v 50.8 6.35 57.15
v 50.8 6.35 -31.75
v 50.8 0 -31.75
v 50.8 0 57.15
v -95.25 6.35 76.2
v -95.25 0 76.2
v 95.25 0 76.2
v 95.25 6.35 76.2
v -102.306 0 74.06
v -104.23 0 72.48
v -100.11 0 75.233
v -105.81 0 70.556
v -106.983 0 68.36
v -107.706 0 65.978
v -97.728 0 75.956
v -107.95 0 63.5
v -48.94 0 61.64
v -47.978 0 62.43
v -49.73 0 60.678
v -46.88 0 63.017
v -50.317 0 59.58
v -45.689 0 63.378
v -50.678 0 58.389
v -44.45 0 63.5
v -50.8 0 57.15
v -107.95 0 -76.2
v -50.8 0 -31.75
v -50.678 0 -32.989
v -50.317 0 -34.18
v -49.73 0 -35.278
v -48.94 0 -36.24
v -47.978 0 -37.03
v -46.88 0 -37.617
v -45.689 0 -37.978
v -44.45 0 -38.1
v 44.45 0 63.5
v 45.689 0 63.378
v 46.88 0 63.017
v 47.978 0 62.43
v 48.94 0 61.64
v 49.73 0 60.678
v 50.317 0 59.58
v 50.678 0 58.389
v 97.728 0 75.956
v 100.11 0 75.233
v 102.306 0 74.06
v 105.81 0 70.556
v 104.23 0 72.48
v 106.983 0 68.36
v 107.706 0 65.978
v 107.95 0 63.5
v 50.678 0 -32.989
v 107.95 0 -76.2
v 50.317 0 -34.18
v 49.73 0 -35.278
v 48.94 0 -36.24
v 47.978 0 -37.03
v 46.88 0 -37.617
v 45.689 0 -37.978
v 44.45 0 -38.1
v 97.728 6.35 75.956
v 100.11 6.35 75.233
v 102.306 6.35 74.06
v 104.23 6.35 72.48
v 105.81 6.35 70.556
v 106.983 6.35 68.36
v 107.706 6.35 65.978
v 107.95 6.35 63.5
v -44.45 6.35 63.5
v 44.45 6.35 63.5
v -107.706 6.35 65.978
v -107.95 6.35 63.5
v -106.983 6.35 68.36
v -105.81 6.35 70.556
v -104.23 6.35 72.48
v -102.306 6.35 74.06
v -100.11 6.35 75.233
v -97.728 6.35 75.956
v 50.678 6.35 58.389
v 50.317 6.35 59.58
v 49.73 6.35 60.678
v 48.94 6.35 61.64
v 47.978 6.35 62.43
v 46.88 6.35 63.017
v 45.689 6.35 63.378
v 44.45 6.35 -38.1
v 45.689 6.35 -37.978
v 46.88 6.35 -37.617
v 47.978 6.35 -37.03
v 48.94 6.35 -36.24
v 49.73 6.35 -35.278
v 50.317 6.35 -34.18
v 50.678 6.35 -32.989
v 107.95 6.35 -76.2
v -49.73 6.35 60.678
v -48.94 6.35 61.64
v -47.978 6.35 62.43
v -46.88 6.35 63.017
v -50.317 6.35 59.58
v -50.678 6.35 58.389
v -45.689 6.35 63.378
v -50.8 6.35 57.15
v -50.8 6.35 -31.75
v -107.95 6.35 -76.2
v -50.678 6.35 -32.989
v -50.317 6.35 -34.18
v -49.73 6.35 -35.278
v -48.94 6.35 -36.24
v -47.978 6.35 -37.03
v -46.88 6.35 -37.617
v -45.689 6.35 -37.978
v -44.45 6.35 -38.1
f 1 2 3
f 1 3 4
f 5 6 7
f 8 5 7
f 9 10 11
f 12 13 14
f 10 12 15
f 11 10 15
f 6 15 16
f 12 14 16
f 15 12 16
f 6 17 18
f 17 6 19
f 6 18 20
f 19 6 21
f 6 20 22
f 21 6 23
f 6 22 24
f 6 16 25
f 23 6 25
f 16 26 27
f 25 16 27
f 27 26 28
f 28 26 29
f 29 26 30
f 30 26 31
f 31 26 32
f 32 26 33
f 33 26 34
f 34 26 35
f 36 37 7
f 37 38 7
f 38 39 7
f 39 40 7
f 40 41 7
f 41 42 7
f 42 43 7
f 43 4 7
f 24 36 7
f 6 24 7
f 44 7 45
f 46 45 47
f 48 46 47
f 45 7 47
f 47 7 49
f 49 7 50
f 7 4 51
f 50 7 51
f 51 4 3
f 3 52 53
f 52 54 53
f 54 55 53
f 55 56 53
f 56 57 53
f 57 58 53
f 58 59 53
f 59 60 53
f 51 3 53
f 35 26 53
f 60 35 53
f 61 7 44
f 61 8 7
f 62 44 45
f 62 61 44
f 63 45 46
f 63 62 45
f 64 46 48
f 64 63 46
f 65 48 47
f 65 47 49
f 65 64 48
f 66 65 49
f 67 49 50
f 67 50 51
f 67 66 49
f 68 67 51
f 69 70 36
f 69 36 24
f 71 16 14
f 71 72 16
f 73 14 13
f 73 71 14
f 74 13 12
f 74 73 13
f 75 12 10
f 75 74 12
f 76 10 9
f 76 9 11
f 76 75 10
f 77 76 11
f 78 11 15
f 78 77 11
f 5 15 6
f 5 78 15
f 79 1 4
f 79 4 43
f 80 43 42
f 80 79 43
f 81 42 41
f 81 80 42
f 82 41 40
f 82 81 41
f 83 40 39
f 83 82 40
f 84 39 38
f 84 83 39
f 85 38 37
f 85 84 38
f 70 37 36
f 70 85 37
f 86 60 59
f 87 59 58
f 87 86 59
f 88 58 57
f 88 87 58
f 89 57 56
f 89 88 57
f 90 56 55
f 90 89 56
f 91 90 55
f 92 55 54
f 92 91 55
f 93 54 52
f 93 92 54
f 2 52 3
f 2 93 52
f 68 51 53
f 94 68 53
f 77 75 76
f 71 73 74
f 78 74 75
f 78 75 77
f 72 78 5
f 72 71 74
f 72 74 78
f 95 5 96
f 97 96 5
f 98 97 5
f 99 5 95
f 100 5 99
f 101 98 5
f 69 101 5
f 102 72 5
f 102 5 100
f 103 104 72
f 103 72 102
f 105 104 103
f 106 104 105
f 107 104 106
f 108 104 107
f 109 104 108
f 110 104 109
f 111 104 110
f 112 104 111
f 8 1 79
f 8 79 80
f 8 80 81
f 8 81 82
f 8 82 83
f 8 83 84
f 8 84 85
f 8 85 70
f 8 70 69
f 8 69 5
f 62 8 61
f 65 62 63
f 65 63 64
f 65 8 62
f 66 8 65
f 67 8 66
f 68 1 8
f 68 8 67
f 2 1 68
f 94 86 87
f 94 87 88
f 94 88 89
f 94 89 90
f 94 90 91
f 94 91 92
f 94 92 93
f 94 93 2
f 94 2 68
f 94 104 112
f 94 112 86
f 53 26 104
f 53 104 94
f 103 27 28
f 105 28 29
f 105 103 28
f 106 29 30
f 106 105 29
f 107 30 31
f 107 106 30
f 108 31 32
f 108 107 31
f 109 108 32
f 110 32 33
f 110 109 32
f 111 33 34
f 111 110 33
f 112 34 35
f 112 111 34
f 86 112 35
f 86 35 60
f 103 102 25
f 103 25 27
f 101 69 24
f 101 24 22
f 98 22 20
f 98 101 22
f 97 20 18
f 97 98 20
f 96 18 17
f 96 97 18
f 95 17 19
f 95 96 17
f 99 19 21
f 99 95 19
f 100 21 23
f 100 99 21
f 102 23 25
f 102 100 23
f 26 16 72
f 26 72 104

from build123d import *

# Parameters (mm, degrees)
ESQUISSE1_W             = 215.9
ESQUISSE1_H             = 152.4
BOSS_EXTRU_1_DEPTH      = 6.35
CONG_1_R                = 12.7
ENL_V_MAT_EXTRU_1_DEPTH = 133.287433266


with BuildPart() as part:
    # Esquisse1 → Boss.-Extru.1 (new body)
    with BuildSketch(Plane(origin=(0, 0, 0), x_dir=(1, 0, 0), z_dir=(0, 1, 0))):
        Rectangle(ESQUISSE1_W, ESQUISSE1_H)
    extrude(amount=BOSS_EXTRU_1_DEPTH)

    # Congé1
    cong_1_edges = [part.edges().sort_by_distance(p)[0] for p in [
        (107.95, 3.175, 76.2),
        (-107.95, 3.175, 76.2),
    ]]
    fillet(cong_1_edges, radius=CONG_1_R)

    # Esquisse2 → Enlèv. mat.-Extru.1 (cut, through all)
    with BuildSketch(Plane(origin=(0, 6.35, 0), x_dir=(1, 0, 0), z_dir=(0, 1, 0))):
        with BuildLine():
            Line((-44.45, 38.1), (44.45, 38.1))
            ThreePointArc((44.45, 38.1), (48.940128061, 36.240128061), (50.8, 31.75))
            Line((50.8, 31.75), (50.8, -57.15))
            ThreePointArc((50.8, -57.15), (48.940128061, -61.640128061), (44.45, -63.5))
            Line((44.45, -63.5), (-44.45, -63.5))
            ThreePointArc((-44.45, -63.5), (-48.940128061, -61.640128061), (-50.8, -57.15))
            Line((-50.8, -57.15), (-50.8, 31.75))
            ThreePointArc((-50.8, 31.75), (-48.940128061, 36.240128061), (-44.45, 38.1))
        make_face()
    extrude(amount=-ENL_V_MAT_EXTRU_1_DEPTH, mode=Mode.SUBTRACT)


solid = part.part
